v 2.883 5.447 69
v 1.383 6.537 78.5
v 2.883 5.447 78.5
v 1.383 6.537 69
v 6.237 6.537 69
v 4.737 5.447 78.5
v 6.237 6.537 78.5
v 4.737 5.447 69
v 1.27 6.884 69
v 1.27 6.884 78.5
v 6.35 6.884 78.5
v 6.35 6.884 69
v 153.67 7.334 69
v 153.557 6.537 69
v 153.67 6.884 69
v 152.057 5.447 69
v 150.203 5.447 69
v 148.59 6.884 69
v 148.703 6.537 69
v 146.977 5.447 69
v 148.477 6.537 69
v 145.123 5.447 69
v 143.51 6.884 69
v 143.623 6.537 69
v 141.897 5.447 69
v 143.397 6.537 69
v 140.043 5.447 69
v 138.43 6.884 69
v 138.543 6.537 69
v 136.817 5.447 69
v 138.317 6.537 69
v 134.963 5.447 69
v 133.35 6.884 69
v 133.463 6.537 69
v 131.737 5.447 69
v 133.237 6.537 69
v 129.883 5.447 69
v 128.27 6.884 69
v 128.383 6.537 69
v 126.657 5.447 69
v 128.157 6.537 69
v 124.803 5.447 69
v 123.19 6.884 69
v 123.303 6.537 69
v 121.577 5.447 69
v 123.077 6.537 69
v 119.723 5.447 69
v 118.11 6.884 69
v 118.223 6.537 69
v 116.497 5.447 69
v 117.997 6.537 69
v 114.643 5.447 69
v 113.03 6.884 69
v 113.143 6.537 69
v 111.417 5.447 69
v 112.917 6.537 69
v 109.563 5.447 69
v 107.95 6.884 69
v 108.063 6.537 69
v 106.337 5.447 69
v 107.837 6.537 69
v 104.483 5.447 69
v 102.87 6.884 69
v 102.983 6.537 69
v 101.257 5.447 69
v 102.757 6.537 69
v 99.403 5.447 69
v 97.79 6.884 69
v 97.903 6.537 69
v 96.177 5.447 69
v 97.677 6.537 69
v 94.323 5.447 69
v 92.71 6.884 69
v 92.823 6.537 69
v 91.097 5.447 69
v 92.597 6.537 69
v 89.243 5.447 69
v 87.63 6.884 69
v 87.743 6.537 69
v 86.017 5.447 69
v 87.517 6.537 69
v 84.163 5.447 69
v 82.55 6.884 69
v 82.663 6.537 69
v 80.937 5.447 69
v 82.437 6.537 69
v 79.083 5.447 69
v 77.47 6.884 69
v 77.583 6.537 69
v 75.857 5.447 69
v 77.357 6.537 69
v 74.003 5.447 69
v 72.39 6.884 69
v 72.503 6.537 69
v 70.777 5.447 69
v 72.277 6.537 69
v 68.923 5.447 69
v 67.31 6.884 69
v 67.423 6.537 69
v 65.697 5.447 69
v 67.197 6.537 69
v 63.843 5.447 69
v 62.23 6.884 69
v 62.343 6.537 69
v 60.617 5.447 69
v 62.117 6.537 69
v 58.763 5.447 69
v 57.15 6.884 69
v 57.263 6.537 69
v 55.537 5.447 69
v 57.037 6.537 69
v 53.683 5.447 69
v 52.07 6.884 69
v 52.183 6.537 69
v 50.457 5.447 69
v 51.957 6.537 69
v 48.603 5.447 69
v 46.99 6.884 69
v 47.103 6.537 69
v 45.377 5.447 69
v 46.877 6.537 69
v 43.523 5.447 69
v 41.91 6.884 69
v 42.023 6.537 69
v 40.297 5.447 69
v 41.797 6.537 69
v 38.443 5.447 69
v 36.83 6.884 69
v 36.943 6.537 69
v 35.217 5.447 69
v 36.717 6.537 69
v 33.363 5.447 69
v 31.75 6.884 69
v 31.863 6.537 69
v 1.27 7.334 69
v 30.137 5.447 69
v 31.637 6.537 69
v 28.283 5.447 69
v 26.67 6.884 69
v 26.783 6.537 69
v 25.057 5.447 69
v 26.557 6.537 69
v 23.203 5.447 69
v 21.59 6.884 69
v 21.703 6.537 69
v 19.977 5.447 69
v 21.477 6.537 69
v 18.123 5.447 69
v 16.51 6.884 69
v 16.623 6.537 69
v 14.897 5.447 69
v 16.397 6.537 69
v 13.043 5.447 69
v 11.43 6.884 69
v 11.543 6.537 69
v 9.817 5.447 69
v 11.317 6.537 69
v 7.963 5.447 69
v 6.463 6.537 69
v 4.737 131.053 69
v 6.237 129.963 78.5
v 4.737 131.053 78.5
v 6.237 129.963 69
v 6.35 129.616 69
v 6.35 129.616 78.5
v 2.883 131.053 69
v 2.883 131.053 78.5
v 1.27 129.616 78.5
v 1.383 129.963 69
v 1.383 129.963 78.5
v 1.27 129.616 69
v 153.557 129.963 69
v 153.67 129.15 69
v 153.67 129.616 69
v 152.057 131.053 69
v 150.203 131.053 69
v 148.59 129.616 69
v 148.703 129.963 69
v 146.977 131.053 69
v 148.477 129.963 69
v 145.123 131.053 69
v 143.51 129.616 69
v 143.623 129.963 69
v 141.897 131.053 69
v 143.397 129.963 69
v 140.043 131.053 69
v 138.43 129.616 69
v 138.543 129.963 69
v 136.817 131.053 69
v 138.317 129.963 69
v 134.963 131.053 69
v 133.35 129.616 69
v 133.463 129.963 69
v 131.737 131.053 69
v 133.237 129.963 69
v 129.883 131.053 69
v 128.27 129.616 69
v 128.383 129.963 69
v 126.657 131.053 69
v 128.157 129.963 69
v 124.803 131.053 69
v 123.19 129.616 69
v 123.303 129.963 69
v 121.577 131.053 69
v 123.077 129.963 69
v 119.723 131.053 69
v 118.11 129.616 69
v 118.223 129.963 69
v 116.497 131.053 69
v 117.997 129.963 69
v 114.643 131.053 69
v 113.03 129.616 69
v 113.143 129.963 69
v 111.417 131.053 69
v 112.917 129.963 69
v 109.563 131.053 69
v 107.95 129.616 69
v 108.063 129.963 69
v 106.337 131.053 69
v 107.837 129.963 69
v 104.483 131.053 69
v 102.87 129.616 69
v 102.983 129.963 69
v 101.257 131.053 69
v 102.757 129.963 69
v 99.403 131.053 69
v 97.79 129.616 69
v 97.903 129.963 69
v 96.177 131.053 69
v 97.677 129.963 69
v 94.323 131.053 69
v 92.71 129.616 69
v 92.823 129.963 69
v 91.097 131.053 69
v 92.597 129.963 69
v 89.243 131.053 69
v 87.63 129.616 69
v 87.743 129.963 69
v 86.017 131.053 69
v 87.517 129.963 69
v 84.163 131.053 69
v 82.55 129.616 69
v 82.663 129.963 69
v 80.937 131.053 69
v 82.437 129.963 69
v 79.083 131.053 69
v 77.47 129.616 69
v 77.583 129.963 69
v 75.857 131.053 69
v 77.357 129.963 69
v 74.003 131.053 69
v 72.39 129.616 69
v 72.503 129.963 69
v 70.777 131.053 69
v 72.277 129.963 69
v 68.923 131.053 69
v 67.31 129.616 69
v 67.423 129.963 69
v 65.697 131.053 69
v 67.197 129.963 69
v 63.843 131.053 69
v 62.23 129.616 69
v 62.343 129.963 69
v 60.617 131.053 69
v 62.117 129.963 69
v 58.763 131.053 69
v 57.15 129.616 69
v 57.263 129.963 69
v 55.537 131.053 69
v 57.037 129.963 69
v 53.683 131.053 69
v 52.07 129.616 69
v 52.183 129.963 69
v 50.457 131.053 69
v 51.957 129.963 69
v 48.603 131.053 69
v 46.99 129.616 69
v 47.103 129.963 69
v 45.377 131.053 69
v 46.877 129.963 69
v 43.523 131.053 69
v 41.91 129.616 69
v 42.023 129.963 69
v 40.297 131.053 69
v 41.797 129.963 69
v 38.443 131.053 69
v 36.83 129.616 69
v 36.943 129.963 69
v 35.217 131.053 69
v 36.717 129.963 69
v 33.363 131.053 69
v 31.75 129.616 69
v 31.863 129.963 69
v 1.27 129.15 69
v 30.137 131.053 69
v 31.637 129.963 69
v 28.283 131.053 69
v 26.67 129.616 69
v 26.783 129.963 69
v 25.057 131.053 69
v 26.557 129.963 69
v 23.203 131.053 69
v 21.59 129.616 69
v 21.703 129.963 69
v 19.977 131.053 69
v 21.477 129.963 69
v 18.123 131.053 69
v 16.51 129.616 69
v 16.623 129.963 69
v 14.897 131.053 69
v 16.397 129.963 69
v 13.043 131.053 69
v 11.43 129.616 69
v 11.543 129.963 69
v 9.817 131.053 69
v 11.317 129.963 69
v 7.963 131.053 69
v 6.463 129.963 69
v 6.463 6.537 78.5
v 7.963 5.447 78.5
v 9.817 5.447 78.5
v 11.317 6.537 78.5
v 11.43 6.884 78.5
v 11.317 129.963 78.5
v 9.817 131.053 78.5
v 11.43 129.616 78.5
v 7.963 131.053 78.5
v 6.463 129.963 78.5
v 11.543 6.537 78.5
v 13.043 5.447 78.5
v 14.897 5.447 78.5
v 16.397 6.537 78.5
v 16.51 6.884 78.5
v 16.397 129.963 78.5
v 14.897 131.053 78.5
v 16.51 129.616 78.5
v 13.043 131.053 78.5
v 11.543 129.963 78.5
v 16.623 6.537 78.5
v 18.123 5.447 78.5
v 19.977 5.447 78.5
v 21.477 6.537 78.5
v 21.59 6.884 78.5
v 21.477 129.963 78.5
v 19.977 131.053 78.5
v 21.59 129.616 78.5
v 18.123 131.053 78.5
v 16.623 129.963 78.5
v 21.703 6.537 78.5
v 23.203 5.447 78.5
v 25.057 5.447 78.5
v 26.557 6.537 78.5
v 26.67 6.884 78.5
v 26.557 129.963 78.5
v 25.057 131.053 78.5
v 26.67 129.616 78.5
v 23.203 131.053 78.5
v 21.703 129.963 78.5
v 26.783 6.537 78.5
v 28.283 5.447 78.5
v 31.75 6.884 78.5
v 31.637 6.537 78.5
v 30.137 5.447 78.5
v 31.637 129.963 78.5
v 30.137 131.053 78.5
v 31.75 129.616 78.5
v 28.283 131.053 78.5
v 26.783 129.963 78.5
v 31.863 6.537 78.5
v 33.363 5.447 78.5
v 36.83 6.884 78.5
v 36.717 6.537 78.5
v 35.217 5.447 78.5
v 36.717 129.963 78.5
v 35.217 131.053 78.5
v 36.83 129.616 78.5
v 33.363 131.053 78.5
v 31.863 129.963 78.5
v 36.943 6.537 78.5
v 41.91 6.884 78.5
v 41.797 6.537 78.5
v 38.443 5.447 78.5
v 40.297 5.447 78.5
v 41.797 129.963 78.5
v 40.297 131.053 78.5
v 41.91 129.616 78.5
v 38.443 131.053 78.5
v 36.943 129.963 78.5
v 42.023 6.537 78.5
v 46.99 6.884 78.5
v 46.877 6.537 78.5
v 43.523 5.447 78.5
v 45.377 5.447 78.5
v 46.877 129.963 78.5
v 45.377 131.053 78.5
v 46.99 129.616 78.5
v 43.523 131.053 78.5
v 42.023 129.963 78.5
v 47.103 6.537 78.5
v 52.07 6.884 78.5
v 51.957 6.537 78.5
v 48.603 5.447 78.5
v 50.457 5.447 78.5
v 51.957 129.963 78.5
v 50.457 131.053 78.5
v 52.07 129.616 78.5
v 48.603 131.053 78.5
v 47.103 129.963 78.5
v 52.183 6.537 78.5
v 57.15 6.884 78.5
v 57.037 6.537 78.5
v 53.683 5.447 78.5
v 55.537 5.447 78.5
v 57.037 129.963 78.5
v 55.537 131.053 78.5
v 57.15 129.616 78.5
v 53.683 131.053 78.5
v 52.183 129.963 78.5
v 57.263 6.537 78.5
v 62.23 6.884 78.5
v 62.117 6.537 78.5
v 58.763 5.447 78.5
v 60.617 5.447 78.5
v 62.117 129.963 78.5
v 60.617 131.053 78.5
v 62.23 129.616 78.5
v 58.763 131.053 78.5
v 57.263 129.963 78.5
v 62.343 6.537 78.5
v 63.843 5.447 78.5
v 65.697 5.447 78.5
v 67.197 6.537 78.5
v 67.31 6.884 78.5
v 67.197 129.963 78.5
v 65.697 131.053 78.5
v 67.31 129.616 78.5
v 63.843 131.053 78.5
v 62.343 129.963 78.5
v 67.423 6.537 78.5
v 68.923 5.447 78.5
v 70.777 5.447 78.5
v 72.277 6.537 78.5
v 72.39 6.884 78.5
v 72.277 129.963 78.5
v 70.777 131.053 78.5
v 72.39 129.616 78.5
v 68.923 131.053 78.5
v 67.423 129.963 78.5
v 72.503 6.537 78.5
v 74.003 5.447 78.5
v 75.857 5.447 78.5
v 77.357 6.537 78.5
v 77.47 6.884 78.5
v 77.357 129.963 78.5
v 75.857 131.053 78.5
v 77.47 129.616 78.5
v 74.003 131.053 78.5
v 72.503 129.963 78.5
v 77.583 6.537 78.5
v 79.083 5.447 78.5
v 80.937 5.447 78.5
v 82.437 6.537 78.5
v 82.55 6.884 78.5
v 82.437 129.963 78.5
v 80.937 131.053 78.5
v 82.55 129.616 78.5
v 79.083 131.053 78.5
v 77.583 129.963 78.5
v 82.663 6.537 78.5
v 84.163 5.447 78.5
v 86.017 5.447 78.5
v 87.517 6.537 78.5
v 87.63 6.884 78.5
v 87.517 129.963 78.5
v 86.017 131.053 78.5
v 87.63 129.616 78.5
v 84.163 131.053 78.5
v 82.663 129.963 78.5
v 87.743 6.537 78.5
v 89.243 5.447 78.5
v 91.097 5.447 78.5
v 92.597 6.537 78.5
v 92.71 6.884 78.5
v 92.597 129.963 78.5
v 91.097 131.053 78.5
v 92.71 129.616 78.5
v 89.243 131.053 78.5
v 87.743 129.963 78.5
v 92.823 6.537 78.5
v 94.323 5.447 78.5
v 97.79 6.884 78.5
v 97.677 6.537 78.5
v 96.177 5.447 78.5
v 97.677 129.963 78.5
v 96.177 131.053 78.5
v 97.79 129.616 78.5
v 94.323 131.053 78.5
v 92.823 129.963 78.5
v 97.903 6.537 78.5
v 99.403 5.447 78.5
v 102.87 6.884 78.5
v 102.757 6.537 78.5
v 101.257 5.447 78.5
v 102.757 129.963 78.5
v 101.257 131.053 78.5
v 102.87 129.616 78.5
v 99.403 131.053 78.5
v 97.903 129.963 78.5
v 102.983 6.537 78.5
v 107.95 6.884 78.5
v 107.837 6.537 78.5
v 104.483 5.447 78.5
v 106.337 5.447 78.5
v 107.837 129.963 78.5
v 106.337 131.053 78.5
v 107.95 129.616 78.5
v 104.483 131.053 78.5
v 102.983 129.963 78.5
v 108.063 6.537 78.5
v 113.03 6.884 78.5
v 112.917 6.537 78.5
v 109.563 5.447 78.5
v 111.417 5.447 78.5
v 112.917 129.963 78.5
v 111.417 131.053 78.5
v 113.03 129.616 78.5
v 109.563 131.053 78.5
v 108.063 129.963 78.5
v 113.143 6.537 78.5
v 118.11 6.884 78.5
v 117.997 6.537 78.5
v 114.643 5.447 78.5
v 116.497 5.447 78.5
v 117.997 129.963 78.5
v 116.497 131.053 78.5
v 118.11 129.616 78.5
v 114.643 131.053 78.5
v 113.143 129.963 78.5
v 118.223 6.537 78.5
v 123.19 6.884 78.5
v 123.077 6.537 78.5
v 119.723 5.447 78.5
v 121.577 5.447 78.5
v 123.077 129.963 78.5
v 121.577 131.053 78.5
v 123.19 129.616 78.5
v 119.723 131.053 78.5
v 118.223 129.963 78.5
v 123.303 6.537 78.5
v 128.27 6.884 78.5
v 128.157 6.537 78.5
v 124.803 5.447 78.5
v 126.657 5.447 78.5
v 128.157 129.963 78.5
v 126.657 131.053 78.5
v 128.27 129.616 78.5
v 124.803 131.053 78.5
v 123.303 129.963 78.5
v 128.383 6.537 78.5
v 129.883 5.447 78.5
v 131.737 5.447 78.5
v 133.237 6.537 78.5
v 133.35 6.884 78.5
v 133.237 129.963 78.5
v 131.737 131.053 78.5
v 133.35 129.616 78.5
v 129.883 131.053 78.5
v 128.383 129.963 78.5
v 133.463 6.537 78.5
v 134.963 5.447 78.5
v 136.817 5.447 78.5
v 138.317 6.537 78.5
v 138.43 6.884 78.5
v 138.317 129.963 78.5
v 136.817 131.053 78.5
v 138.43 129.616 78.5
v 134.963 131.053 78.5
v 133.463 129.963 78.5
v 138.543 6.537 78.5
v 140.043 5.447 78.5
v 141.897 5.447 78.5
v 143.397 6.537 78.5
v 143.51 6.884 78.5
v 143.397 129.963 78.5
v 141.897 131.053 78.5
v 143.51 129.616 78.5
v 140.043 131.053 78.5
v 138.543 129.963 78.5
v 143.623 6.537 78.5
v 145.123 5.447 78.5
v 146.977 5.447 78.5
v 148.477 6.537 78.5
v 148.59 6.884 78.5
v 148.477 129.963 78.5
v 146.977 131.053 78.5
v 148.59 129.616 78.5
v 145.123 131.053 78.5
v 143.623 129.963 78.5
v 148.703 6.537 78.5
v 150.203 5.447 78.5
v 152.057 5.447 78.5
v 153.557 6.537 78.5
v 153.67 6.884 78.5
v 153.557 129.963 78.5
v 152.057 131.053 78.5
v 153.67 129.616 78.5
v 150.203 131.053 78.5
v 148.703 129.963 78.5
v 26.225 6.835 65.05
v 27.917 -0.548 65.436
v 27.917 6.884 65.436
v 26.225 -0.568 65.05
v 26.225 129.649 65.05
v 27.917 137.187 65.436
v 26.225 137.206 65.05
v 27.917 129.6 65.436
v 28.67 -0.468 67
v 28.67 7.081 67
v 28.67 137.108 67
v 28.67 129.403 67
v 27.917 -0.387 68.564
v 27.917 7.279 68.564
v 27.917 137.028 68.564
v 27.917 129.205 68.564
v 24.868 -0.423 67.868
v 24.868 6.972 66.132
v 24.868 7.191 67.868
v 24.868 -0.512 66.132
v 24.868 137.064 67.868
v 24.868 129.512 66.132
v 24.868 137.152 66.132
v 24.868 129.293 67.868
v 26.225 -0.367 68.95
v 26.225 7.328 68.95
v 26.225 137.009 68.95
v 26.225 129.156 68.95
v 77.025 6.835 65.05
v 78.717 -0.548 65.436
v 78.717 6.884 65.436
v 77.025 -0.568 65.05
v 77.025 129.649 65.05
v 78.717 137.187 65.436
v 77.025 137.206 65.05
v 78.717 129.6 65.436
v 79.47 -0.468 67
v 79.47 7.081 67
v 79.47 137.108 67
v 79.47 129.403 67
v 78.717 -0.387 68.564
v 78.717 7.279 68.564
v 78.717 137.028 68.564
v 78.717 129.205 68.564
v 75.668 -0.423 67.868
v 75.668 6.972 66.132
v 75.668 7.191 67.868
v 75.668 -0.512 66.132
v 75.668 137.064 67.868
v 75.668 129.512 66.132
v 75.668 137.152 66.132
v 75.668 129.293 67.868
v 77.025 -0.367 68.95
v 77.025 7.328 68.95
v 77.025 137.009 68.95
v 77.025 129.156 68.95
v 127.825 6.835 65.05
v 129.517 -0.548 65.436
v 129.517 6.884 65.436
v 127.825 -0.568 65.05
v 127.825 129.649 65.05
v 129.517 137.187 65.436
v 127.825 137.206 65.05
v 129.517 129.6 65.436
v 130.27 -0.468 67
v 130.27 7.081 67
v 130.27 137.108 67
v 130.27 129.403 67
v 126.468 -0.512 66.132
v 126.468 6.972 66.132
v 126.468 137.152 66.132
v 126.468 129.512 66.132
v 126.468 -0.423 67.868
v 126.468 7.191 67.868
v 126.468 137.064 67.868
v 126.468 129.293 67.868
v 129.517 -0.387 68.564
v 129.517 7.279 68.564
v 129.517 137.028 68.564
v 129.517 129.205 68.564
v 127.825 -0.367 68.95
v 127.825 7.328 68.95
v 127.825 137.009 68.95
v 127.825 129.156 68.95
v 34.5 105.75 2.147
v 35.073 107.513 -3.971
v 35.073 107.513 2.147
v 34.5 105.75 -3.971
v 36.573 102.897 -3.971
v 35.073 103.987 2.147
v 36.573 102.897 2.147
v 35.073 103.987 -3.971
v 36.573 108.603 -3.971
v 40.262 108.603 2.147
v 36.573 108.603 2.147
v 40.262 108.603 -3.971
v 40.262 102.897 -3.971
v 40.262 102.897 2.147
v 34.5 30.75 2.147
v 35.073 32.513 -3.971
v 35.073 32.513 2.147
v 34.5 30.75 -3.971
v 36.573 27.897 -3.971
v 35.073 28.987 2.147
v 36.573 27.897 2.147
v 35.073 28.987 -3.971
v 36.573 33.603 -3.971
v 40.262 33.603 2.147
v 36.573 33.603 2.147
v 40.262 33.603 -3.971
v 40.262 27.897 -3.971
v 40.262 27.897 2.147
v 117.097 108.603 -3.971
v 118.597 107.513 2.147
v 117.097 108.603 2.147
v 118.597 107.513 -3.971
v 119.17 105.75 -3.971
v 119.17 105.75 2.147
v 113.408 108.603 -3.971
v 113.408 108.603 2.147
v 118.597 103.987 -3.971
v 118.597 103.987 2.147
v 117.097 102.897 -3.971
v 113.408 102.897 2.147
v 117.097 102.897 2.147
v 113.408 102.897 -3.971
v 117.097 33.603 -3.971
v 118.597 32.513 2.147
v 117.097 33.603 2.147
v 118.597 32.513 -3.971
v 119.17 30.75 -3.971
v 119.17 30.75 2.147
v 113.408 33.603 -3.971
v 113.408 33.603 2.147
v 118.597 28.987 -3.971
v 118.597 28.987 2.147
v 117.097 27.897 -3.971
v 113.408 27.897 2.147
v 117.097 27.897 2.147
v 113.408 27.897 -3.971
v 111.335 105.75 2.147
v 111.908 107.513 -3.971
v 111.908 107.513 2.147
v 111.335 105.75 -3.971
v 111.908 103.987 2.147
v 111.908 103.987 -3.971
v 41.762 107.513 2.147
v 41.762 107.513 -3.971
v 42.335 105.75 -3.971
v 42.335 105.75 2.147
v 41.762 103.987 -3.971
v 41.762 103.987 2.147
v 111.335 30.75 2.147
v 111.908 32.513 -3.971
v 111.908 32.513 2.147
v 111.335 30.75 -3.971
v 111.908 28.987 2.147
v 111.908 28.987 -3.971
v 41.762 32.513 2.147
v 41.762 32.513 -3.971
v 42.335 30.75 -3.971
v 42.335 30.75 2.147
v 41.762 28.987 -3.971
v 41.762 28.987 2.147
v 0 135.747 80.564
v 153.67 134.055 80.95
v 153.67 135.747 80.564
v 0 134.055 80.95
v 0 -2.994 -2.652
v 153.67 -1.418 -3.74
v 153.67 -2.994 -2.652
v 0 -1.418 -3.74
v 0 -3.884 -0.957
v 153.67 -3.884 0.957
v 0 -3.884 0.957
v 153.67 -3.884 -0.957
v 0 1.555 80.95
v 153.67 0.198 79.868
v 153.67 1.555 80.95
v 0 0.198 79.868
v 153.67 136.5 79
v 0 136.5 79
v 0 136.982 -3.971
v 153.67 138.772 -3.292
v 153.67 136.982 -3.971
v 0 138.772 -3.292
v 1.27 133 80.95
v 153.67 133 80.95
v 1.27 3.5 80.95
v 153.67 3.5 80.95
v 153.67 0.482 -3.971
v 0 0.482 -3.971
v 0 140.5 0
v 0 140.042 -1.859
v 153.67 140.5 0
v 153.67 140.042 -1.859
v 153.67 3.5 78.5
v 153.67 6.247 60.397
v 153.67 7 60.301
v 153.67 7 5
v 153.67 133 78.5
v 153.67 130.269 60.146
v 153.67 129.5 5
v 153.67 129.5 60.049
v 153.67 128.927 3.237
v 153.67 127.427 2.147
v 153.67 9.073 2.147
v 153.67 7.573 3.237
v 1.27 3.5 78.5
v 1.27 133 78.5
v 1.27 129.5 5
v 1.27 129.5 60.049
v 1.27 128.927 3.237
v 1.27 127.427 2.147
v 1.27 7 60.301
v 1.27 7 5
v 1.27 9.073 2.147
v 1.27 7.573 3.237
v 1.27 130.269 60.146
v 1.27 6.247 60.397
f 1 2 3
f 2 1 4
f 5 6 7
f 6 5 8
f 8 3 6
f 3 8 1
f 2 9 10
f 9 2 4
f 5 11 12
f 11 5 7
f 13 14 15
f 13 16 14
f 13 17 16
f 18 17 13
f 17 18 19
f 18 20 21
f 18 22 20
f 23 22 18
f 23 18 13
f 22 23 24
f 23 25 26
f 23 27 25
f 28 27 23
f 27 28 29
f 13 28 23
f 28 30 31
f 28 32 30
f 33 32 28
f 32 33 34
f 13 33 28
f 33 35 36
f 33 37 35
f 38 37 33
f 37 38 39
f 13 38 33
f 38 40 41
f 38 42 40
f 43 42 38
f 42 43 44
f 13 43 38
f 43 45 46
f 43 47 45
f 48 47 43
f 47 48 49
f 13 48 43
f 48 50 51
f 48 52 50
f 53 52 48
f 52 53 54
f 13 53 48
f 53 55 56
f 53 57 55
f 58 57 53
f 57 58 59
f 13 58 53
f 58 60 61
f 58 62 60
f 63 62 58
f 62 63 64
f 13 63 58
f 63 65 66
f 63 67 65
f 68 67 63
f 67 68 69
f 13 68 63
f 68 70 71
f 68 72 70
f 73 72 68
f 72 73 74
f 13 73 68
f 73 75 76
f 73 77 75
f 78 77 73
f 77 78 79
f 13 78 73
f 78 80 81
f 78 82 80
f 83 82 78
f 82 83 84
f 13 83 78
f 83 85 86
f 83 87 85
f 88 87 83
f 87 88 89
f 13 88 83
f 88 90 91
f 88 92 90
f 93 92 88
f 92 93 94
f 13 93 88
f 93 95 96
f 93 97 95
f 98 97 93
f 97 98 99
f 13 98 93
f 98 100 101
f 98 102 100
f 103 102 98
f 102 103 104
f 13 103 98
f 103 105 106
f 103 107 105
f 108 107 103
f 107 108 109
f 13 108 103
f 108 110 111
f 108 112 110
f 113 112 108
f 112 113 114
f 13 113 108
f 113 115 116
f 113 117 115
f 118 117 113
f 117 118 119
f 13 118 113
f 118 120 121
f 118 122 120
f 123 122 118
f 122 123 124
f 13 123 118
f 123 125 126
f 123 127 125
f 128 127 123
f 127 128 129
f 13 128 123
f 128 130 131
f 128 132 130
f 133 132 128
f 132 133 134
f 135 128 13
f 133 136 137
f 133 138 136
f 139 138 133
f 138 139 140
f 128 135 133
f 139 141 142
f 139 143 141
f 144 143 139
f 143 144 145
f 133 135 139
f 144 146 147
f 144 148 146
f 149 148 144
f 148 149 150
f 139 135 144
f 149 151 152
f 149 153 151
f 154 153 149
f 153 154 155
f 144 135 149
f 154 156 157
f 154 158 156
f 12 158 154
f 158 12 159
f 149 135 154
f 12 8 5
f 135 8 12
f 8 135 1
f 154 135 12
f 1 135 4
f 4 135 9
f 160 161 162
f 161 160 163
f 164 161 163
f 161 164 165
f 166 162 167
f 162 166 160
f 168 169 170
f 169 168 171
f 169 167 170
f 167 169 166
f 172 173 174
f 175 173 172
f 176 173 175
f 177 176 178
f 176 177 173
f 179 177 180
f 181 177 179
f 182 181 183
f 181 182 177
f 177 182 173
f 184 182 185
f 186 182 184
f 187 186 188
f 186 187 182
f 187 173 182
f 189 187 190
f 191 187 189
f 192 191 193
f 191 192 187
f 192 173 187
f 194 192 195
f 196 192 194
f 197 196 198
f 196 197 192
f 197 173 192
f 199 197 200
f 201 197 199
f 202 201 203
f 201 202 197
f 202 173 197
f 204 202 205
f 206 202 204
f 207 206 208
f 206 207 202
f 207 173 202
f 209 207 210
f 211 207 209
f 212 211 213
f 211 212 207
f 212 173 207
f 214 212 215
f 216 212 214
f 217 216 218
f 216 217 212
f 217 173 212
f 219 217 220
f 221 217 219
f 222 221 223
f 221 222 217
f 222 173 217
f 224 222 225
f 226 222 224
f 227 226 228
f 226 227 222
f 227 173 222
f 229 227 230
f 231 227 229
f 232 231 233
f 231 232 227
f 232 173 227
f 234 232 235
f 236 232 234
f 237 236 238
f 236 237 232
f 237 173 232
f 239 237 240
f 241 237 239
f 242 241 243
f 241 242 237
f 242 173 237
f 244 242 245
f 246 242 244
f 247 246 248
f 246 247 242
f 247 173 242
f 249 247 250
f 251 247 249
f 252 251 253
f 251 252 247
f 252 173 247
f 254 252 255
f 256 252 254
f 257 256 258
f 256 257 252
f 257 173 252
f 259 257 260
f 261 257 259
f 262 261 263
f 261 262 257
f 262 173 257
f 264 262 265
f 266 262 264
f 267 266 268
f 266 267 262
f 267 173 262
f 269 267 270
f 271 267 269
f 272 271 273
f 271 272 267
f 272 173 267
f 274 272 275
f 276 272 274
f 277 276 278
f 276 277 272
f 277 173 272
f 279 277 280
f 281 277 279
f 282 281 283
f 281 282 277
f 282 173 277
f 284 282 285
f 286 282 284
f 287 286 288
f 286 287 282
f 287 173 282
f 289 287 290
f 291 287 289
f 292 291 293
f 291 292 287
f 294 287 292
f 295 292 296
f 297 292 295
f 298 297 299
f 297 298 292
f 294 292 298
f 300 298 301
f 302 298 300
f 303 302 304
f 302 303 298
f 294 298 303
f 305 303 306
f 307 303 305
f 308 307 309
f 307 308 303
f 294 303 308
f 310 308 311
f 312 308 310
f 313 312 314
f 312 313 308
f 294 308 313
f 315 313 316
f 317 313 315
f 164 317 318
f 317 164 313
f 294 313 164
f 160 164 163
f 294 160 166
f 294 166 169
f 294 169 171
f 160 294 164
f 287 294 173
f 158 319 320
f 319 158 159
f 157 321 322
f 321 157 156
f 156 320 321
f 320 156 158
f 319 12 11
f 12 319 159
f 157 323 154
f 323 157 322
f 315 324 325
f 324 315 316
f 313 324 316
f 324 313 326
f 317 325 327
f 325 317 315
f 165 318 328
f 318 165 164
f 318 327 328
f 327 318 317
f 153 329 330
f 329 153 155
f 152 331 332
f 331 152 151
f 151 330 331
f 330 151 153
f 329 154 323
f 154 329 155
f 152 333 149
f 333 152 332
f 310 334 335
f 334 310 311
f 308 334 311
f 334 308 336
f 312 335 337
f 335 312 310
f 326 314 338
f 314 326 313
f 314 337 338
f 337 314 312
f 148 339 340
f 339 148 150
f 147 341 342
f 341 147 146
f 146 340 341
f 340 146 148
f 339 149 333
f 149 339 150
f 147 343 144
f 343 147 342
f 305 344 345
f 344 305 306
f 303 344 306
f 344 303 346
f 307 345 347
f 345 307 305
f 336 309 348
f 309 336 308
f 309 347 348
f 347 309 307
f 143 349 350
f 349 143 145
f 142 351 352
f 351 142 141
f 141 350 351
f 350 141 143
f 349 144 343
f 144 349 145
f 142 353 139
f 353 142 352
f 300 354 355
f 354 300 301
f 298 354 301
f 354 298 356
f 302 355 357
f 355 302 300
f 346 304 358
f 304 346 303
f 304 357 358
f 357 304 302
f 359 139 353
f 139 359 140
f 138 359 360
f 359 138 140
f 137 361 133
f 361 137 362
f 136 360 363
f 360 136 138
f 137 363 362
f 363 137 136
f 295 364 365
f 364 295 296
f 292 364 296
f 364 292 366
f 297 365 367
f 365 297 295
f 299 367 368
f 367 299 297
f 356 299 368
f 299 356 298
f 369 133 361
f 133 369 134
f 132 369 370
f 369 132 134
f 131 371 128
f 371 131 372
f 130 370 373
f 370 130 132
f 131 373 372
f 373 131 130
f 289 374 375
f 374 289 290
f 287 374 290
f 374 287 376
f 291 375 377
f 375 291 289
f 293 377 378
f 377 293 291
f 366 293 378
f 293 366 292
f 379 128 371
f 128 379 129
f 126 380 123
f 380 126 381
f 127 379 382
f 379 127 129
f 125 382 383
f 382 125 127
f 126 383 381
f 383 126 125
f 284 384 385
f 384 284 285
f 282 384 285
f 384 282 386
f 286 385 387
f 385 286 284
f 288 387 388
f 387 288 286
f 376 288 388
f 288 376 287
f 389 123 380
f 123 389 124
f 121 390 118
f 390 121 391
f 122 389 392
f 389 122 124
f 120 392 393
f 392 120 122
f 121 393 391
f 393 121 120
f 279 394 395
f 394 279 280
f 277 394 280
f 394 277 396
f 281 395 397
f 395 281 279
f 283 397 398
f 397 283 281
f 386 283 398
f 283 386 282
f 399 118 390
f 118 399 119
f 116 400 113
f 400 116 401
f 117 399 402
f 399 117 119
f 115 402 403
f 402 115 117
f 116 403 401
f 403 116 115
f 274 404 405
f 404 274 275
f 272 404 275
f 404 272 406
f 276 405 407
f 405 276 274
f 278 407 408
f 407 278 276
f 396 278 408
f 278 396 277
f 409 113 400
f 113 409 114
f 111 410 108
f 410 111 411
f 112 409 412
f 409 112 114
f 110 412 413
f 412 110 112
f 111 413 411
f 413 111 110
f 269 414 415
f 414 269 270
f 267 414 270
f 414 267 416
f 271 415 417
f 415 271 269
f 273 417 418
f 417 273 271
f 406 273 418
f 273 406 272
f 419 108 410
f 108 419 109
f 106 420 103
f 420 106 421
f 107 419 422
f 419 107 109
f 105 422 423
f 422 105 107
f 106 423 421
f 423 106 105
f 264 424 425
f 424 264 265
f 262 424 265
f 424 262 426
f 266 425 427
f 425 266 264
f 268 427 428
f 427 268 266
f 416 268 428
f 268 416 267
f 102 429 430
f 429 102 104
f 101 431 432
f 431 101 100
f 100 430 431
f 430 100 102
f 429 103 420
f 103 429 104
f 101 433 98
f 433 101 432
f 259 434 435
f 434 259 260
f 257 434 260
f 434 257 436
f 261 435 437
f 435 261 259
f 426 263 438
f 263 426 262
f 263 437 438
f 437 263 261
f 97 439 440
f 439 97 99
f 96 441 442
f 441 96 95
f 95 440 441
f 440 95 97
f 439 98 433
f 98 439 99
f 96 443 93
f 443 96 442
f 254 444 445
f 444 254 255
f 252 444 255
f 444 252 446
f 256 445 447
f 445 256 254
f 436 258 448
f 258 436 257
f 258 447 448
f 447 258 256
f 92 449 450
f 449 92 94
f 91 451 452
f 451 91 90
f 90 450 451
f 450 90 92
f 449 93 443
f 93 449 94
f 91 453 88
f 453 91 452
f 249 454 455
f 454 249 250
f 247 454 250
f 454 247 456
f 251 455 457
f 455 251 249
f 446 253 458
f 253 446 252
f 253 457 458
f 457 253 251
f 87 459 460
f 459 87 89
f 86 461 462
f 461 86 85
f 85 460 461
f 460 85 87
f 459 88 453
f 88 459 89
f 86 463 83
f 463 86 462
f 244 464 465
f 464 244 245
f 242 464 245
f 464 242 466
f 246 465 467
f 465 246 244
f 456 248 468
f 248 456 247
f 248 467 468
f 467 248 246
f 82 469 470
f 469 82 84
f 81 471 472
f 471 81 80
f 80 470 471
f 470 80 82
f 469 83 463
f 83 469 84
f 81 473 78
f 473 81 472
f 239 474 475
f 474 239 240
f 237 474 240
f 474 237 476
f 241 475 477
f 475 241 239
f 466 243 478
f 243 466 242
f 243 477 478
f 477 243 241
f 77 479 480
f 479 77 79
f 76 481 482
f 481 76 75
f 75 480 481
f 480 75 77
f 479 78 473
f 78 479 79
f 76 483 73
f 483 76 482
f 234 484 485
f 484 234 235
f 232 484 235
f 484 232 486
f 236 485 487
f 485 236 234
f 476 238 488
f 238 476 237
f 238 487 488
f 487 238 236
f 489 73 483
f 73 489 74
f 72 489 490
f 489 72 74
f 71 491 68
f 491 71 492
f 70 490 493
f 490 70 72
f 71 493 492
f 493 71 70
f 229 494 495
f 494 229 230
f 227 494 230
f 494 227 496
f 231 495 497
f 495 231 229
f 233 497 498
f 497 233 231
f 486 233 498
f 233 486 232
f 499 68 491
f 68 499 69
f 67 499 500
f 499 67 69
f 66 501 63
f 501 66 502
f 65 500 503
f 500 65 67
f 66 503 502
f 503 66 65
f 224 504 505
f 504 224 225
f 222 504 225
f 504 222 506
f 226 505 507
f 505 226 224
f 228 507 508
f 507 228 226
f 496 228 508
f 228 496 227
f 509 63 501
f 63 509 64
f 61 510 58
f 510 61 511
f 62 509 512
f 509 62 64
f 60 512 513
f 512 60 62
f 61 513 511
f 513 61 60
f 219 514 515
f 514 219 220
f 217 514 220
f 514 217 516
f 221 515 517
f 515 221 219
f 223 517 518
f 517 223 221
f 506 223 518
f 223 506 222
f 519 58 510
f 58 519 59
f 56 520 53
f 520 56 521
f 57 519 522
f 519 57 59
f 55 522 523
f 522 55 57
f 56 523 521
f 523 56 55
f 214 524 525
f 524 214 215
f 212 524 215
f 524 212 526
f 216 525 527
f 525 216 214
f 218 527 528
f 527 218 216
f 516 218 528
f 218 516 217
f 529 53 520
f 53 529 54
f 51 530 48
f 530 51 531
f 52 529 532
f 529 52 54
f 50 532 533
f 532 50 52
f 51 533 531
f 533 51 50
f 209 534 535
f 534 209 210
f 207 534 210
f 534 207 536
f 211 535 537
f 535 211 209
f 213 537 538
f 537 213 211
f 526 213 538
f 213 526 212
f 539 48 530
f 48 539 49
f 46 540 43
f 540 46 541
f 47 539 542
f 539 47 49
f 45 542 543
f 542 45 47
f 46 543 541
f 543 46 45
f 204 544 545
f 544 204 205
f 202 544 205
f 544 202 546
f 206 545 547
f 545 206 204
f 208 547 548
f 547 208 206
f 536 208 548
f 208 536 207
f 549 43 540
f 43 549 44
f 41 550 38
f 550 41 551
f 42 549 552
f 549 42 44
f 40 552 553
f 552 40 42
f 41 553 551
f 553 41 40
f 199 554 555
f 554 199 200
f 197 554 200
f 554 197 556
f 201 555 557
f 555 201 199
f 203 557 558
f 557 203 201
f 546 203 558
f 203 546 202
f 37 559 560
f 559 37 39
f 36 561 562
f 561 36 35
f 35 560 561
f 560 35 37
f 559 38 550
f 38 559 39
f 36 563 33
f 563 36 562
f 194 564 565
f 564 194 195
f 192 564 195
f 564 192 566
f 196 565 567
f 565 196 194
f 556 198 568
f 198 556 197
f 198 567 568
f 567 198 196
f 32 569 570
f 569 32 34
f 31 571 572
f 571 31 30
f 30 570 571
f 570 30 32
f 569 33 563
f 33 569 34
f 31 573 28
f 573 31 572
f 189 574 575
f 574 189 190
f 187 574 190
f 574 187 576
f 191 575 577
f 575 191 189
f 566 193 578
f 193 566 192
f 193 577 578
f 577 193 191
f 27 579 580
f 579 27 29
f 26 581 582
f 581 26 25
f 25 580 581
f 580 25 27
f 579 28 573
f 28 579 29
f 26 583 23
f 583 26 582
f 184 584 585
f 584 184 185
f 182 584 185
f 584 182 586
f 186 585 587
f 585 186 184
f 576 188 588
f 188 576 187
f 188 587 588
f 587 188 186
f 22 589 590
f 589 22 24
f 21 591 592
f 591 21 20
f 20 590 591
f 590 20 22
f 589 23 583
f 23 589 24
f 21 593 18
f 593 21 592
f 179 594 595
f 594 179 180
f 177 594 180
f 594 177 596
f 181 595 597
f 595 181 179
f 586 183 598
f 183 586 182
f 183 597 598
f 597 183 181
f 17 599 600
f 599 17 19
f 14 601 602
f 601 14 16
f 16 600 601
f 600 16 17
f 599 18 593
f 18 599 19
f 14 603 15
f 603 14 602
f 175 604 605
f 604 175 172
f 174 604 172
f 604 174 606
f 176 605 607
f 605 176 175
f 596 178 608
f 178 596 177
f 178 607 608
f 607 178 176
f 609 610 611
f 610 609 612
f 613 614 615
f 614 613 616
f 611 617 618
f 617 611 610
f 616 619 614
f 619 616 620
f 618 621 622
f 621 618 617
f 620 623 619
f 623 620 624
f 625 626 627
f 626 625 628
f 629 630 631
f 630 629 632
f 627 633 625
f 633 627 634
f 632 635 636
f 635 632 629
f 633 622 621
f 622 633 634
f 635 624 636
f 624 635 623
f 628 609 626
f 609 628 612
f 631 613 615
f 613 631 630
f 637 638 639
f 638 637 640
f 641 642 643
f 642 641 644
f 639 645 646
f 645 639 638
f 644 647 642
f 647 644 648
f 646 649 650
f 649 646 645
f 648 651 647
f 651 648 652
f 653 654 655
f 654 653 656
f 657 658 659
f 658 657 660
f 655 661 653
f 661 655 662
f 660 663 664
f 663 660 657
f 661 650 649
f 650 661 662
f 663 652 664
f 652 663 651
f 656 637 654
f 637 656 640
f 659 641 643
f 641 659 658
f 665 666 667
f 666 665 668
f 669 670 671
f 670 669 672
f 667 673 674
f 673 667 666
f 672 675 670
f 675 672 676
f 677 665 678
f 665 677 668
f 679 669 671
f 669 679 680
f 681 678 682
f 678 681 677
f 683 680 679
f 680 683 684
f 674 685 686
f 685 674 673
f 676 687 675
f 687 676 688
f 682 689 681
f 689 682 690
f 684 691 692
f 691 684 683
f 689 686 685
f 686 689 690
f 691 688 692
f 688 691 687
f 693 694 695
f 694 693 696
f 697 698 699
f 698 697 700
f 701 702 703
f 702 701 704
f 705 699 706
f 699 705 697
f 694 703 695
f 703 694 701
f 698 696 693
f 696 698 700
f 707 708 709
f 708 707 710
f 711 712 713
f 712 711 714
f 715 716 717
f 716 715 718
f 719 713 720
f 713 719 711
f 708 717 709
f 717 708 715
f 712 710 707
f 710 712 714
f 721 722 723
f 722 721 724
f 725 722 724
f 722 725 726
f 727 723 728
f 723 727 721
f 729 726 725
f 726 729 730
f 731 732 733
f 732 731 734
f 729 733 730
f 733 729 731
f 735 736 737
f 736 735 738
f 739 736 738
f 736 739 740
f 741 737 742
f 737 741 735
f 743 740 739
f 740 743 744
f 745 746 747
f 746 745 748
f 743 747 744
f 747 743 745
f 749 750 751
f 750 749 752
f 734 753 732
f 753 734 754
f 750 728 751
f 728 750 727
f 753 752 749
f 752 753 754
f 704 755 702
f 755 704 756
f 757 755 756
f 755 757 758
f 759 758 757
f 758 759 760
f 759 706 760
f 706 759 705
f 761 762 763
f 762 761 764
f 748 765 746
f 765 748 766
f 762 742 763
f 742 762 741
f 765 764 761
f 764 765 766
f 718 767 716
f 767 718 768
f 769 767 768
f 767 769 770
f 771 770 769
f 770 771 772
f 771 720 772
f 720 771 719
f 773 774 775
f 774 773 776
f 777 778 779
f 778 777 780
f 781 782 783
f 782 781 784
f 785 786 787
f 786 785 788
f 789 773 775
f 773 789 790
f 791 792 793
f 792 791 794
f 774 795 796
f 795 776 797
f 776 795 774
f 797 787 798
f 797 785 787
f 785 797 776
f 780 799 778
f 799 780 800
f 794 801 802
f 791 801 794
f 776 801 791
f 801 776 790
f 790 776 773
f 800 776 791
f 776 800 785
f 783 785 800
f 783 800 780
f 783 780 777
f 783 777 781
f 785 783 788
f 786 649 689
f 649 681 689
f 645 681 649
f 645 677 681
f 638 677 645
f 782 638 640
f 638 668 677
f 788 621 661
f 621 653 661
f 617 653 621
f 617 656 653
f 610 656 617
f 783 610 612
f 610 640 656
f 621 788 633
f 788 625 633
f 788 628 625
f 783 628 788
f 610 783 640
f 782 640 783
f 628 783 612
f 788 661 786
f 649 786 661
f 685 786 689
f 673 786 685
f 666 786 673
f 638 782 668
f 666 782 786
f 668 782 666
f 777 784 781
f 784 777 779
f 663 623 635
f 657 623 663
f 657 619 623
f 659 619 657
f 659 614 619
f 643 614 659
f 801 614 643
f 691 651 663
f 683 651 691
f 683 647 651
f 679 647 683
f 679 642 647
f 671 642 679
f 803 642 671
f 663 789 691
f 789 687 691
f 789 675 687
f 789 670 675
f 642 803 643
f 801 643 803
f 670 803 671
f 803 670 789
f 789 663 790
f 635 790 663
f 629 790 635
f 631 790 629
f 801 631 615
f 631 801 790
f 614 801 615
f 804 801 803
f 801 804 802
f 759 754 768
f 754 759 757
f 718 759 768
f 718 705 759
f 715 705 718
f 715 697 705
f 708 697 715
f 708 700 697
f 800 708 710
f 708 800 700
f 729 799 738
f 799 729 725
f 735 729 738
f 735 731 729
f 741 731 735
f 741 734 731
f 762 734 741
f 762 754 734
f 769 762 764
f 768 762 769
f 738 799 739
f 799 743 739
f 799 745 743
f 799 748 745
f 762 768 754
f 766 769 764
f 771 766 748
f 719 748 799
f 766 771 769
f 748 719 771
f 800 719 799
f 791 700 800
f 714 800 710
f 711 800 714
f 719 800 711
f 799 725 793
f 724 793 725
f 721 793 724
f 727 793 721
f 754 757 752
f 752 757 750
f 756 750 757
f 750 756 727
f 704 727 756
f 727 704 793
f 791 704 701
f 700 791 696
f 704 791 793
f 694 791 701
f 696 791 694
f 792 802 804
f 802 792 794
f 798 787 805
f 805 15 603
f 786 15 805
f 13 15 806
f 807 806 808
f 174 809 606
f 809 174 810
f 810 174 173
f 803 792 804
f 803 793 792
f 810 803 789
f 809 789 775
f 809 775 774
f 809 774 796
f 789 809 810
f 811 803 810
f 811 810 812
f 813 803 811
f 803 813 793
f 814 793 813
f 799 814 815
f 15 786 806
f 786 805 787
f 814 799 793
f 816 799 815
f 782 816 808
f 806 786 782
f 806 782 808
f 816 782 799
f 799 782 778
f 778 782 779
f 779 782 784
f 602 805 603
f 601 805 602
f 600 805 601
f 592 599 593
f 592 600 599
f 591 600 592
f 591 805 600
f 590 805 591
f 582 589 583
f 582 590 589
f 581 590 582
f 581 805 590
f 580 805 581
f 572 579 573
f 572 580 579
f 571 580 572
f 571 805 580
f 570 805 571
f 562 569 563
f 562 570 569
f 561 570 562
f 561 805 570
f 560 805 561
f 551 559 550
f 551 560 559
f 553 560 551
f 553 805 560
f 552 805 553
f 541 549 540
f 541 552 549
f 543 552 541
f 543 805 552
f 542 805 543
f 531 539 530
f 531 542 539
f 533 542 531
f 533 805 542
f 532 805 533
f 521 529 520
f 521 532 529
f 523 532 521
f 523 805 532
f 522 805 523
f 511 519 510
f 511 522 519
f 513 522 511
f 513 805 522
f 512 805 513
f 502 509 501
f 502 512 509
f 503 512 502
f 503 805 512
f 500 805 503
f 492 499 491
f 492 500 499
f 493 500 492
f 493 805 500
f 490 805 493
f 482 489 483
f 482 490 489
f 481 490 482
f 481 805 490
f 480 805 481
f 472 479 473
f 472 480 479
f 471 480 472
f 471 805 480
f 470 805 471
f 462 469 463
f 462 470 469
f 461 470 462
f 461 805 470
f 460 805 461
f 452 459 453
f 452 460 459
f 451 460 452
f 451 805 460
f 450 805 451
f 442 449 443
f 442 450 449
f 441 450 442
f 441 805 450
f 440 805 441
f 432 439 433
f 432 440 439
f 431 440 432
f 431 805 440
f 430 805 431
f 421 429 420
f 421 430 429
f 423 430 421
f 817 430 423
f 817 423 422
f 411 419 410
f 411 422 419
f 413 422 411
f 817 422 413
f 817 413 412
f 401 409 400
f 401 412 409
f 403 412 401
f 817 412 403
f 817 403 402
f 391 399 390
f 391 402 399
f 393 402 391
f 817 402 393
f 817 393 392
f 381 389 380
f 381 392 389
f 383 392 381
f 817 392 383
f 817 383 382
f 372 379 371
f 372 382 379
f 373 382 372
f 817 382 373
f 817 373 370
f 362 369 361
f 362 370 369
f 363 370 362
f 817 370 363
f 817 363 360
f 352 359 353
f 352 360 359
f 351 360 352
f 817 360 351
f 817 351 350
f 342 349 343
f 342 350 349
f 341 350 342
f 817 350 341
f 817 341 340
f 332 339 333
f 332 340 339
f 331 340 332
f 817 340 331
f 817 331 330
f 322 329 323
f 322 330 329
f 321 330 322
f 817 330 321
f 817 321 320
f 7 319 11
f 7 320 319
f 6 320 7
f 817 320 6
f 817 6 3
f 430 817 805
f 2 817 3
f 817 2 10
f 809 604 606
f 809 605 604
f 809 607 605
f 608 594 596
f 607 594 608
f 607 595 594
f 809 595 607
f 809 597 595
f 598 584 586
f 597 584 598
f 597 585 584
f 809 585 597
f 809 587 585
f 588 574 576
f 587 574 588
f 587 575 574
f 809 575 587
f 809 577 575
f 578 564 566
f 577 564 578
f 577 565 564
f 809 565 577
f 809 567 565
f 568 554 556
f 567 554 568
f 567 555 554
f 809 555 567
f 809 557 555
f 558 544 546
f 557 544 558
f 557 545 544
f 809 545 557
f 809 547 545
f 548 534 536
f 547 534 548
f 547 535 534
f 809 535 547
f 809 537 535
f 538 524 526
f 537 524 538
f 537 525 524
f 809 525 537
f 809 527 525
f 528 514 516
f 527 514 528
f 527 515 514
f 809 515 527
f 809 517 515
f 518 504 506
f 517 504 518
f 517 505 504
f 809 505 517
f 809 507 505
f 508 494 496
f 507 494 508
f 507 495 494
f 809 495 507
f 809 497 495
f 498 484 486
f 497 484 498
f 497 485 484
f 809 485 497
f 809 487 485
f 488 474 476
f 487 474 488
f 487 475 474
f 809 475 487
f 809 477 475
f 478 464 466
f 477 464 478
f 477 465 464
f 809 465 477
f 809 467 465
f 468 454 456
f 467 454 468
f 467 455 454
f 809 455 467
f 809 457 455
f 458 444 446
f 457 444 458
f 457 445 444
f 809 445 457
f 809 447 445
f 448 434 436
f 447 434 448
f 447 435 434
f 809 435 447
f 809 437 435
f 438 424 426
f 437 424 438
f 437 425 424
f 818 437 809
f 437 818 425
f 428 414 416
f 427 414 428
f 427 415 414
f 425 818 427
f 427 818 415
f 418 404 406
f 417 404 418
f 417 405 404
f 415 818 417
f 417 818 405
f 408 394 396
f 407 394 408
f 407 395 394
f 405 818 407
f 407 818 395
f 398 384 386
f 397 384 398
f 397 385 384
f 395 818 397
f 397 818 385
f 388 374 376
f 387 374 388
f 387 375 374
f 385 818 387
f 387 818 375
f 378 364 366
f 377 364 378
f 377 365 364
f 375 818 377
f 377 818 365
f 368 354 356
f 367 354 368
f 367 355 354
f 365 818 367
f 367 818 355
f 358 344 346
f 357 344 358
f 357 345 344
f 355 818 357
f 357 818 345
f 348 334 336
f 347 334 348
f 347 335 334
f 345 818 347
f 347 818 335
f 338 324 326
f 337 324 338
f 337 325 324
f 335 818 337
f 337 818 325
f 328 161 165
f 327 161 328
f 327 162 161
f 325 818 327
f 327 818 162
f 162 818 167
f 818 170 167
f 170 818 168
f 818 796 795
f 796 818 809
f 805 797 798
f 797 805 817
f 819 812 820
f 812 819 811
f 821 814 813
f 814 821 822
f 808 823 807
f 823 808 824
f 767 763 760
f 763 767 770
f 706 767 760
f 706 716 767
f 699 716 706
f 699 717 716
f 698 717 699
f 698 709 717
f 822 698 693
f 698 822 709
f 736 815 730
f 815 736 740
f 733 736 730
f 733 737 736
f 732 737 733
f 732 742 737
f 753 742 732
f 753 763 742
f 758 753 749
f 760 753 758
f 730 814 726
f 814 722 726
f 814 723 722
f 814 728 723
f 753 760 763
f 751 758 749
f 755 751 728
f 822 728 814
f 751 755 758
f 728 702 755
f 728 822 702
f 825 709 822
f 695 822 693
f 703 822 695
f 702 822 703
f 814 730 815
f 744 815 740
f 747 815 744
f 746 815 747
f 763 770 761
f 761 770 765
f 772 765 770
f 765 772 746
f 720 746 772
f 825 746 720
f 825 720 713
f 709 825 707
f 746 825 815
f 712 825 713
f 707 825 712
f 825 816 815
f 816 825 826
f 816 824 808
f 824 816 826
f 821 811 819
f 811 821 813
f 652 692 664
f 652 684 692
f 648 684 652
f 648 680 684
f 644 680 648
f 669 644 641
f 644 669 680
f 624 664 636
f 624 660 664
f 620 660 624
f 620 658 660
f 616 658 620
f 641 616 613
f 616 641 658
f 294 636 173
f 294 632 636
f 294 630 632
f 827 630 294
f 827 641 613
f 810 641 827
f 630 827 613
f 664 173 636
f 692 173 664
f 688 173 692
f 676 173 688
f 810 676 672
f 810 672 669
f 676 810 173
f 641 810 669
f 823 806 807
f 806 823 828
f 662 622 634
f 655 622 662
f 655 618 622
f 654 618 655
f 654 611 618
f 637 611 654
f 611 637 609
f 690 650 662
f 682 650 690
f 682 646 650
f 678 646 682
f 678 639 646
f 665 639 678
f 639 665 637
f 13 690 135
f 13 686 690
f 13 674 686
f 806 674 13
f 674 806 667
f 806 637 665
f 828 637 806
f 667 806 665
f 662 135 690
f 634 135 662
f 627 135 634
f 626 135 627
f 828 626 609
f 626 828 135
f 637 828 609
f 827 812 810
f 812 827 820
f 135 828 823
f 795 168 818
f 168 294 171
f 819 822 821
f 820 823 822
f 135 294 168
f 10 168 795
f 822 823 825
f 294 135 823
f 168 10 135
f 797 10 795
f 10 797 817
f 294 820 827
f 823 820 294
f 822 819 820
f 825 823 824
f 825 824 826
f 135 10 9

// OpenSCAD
U = 5.08;
H = 128.5 + 1;
W = 30.25*U;
R = 1.65;
Depth = 80;
P = 2.3;
SW = U / 4;
BarHeight = 18.5;

module vesa(space = 75, h = 100) {
  r = space / 2;

  translate([r, r, 0])
  cylinder(h, 3, 3);

  translate([-r, r, 0])
  cylinder(h, 3, 3);

  translate([r, -r, 0])
  cylinder(h, 3, 3);

  translate([-r, -r, 0])
  cylinder(h, 3, 3);
}

module box1() {
  difference() {
    union() {
      rotate([90, 0, 90])
      hull() {
        translate([0, 0, 0])
        cylinder(W, 4, 4);

        translate([2, Depth - 1, 0])
        cylinder(W, 2, 2);

        translate([H + 7 - 2, Depth - 1, 0])
        cylinder(W, 2, 2);

        translate([H + 7, 0, 0])
        cylinder(W, 4, 4);
      }
    }

    translate([-1, 3.5, Depth - 1.5])
    cube([W + 2, H, Depth - 1.5]);

    // translate([-1, 7, 6])
    // cube([W + 2, H - 7, Depth - 5]);

    union() {
      rotate([90, 0, 90])
      hull() {
        translate([10, 5, -1])
        cylinder(W + 2, 3, 3);

        translate([7, Depth - 15, 0])
        cube([H - 7, 1, W]);

        translate([H - 3, 5, -1])
        cylinder(W + 2, 3, 3);
      }
    }


    translate([SW, 3.5, 0])
    for (i = [U/2:U:W]) {
        translate([i, 3.5 + 1.3, Depth - 11])
        cylinder(100, 3, 3, $fn = 10);

        translate([i, H - 3.5 - 1.3, Depth - 11])
        cylinder(100, 3, 3, $fn = 10);
    }

    for ( i = [5 * U + SW: 10 * U : W - U] ) {
      translate([i, -1, Depth - 13])
      rotate([270, 0, 0])
      cylinder(1000, 2, 2);
    }


    hull() {
      translate([-1, 10.55, Depth - 1.5])
      rotate([180 + -7.2, 0, 0])
      cube([W + 2, 2, BarHeight]);

      translate([-1, H - 1.55, Depth - 1.5])
      rotate([180 + 7.2, 0, 0])
      cube([W + 2, 2, BarHeight]);
    }

    translate([0, (H + 7) / 2, -10])
    vesa(75);

    translate([W, (H + 7) / 2, -10])
    vesa(75);

    if (W > 100) {
      translate([W / 2, (H + 7) / 2, -10])
      vesa(75);
    }

  }

    if (SW > 0) {
      union() {
        rotate([90, 0, 90])
        hull() {
          translate([0, 0, 0])
          cylinder(SW, 4, 4);

          translate([2, Depth - 1, 0])
          cylinder(SW, 2, 2);

          translate([H + 7 - 2, Depth - 1, 0])
          cylinder(SW, 2, 2);

          translate([H + 7, 0, 0])
          cylinder(SW, 4, 4);
        }
      }
/*
      translate([W - SW, 0, 0])
      union() {
        rotate([90, 0, 90])
        hull() {
          translate([0, 0, 0])
          cylinder(SW, 4, 4);

          translate([2, Depth - 1, 0])
          cylinder(SW, 2, 2);

          translate([H + 7 - 2, Depth - 1, 0])
          cylinder(SW, 2, 2);

          translate([H + 7, 0, 0])
          cylinder(SW, 4, 4);
        }
      }
*/
    }
}




box1();
